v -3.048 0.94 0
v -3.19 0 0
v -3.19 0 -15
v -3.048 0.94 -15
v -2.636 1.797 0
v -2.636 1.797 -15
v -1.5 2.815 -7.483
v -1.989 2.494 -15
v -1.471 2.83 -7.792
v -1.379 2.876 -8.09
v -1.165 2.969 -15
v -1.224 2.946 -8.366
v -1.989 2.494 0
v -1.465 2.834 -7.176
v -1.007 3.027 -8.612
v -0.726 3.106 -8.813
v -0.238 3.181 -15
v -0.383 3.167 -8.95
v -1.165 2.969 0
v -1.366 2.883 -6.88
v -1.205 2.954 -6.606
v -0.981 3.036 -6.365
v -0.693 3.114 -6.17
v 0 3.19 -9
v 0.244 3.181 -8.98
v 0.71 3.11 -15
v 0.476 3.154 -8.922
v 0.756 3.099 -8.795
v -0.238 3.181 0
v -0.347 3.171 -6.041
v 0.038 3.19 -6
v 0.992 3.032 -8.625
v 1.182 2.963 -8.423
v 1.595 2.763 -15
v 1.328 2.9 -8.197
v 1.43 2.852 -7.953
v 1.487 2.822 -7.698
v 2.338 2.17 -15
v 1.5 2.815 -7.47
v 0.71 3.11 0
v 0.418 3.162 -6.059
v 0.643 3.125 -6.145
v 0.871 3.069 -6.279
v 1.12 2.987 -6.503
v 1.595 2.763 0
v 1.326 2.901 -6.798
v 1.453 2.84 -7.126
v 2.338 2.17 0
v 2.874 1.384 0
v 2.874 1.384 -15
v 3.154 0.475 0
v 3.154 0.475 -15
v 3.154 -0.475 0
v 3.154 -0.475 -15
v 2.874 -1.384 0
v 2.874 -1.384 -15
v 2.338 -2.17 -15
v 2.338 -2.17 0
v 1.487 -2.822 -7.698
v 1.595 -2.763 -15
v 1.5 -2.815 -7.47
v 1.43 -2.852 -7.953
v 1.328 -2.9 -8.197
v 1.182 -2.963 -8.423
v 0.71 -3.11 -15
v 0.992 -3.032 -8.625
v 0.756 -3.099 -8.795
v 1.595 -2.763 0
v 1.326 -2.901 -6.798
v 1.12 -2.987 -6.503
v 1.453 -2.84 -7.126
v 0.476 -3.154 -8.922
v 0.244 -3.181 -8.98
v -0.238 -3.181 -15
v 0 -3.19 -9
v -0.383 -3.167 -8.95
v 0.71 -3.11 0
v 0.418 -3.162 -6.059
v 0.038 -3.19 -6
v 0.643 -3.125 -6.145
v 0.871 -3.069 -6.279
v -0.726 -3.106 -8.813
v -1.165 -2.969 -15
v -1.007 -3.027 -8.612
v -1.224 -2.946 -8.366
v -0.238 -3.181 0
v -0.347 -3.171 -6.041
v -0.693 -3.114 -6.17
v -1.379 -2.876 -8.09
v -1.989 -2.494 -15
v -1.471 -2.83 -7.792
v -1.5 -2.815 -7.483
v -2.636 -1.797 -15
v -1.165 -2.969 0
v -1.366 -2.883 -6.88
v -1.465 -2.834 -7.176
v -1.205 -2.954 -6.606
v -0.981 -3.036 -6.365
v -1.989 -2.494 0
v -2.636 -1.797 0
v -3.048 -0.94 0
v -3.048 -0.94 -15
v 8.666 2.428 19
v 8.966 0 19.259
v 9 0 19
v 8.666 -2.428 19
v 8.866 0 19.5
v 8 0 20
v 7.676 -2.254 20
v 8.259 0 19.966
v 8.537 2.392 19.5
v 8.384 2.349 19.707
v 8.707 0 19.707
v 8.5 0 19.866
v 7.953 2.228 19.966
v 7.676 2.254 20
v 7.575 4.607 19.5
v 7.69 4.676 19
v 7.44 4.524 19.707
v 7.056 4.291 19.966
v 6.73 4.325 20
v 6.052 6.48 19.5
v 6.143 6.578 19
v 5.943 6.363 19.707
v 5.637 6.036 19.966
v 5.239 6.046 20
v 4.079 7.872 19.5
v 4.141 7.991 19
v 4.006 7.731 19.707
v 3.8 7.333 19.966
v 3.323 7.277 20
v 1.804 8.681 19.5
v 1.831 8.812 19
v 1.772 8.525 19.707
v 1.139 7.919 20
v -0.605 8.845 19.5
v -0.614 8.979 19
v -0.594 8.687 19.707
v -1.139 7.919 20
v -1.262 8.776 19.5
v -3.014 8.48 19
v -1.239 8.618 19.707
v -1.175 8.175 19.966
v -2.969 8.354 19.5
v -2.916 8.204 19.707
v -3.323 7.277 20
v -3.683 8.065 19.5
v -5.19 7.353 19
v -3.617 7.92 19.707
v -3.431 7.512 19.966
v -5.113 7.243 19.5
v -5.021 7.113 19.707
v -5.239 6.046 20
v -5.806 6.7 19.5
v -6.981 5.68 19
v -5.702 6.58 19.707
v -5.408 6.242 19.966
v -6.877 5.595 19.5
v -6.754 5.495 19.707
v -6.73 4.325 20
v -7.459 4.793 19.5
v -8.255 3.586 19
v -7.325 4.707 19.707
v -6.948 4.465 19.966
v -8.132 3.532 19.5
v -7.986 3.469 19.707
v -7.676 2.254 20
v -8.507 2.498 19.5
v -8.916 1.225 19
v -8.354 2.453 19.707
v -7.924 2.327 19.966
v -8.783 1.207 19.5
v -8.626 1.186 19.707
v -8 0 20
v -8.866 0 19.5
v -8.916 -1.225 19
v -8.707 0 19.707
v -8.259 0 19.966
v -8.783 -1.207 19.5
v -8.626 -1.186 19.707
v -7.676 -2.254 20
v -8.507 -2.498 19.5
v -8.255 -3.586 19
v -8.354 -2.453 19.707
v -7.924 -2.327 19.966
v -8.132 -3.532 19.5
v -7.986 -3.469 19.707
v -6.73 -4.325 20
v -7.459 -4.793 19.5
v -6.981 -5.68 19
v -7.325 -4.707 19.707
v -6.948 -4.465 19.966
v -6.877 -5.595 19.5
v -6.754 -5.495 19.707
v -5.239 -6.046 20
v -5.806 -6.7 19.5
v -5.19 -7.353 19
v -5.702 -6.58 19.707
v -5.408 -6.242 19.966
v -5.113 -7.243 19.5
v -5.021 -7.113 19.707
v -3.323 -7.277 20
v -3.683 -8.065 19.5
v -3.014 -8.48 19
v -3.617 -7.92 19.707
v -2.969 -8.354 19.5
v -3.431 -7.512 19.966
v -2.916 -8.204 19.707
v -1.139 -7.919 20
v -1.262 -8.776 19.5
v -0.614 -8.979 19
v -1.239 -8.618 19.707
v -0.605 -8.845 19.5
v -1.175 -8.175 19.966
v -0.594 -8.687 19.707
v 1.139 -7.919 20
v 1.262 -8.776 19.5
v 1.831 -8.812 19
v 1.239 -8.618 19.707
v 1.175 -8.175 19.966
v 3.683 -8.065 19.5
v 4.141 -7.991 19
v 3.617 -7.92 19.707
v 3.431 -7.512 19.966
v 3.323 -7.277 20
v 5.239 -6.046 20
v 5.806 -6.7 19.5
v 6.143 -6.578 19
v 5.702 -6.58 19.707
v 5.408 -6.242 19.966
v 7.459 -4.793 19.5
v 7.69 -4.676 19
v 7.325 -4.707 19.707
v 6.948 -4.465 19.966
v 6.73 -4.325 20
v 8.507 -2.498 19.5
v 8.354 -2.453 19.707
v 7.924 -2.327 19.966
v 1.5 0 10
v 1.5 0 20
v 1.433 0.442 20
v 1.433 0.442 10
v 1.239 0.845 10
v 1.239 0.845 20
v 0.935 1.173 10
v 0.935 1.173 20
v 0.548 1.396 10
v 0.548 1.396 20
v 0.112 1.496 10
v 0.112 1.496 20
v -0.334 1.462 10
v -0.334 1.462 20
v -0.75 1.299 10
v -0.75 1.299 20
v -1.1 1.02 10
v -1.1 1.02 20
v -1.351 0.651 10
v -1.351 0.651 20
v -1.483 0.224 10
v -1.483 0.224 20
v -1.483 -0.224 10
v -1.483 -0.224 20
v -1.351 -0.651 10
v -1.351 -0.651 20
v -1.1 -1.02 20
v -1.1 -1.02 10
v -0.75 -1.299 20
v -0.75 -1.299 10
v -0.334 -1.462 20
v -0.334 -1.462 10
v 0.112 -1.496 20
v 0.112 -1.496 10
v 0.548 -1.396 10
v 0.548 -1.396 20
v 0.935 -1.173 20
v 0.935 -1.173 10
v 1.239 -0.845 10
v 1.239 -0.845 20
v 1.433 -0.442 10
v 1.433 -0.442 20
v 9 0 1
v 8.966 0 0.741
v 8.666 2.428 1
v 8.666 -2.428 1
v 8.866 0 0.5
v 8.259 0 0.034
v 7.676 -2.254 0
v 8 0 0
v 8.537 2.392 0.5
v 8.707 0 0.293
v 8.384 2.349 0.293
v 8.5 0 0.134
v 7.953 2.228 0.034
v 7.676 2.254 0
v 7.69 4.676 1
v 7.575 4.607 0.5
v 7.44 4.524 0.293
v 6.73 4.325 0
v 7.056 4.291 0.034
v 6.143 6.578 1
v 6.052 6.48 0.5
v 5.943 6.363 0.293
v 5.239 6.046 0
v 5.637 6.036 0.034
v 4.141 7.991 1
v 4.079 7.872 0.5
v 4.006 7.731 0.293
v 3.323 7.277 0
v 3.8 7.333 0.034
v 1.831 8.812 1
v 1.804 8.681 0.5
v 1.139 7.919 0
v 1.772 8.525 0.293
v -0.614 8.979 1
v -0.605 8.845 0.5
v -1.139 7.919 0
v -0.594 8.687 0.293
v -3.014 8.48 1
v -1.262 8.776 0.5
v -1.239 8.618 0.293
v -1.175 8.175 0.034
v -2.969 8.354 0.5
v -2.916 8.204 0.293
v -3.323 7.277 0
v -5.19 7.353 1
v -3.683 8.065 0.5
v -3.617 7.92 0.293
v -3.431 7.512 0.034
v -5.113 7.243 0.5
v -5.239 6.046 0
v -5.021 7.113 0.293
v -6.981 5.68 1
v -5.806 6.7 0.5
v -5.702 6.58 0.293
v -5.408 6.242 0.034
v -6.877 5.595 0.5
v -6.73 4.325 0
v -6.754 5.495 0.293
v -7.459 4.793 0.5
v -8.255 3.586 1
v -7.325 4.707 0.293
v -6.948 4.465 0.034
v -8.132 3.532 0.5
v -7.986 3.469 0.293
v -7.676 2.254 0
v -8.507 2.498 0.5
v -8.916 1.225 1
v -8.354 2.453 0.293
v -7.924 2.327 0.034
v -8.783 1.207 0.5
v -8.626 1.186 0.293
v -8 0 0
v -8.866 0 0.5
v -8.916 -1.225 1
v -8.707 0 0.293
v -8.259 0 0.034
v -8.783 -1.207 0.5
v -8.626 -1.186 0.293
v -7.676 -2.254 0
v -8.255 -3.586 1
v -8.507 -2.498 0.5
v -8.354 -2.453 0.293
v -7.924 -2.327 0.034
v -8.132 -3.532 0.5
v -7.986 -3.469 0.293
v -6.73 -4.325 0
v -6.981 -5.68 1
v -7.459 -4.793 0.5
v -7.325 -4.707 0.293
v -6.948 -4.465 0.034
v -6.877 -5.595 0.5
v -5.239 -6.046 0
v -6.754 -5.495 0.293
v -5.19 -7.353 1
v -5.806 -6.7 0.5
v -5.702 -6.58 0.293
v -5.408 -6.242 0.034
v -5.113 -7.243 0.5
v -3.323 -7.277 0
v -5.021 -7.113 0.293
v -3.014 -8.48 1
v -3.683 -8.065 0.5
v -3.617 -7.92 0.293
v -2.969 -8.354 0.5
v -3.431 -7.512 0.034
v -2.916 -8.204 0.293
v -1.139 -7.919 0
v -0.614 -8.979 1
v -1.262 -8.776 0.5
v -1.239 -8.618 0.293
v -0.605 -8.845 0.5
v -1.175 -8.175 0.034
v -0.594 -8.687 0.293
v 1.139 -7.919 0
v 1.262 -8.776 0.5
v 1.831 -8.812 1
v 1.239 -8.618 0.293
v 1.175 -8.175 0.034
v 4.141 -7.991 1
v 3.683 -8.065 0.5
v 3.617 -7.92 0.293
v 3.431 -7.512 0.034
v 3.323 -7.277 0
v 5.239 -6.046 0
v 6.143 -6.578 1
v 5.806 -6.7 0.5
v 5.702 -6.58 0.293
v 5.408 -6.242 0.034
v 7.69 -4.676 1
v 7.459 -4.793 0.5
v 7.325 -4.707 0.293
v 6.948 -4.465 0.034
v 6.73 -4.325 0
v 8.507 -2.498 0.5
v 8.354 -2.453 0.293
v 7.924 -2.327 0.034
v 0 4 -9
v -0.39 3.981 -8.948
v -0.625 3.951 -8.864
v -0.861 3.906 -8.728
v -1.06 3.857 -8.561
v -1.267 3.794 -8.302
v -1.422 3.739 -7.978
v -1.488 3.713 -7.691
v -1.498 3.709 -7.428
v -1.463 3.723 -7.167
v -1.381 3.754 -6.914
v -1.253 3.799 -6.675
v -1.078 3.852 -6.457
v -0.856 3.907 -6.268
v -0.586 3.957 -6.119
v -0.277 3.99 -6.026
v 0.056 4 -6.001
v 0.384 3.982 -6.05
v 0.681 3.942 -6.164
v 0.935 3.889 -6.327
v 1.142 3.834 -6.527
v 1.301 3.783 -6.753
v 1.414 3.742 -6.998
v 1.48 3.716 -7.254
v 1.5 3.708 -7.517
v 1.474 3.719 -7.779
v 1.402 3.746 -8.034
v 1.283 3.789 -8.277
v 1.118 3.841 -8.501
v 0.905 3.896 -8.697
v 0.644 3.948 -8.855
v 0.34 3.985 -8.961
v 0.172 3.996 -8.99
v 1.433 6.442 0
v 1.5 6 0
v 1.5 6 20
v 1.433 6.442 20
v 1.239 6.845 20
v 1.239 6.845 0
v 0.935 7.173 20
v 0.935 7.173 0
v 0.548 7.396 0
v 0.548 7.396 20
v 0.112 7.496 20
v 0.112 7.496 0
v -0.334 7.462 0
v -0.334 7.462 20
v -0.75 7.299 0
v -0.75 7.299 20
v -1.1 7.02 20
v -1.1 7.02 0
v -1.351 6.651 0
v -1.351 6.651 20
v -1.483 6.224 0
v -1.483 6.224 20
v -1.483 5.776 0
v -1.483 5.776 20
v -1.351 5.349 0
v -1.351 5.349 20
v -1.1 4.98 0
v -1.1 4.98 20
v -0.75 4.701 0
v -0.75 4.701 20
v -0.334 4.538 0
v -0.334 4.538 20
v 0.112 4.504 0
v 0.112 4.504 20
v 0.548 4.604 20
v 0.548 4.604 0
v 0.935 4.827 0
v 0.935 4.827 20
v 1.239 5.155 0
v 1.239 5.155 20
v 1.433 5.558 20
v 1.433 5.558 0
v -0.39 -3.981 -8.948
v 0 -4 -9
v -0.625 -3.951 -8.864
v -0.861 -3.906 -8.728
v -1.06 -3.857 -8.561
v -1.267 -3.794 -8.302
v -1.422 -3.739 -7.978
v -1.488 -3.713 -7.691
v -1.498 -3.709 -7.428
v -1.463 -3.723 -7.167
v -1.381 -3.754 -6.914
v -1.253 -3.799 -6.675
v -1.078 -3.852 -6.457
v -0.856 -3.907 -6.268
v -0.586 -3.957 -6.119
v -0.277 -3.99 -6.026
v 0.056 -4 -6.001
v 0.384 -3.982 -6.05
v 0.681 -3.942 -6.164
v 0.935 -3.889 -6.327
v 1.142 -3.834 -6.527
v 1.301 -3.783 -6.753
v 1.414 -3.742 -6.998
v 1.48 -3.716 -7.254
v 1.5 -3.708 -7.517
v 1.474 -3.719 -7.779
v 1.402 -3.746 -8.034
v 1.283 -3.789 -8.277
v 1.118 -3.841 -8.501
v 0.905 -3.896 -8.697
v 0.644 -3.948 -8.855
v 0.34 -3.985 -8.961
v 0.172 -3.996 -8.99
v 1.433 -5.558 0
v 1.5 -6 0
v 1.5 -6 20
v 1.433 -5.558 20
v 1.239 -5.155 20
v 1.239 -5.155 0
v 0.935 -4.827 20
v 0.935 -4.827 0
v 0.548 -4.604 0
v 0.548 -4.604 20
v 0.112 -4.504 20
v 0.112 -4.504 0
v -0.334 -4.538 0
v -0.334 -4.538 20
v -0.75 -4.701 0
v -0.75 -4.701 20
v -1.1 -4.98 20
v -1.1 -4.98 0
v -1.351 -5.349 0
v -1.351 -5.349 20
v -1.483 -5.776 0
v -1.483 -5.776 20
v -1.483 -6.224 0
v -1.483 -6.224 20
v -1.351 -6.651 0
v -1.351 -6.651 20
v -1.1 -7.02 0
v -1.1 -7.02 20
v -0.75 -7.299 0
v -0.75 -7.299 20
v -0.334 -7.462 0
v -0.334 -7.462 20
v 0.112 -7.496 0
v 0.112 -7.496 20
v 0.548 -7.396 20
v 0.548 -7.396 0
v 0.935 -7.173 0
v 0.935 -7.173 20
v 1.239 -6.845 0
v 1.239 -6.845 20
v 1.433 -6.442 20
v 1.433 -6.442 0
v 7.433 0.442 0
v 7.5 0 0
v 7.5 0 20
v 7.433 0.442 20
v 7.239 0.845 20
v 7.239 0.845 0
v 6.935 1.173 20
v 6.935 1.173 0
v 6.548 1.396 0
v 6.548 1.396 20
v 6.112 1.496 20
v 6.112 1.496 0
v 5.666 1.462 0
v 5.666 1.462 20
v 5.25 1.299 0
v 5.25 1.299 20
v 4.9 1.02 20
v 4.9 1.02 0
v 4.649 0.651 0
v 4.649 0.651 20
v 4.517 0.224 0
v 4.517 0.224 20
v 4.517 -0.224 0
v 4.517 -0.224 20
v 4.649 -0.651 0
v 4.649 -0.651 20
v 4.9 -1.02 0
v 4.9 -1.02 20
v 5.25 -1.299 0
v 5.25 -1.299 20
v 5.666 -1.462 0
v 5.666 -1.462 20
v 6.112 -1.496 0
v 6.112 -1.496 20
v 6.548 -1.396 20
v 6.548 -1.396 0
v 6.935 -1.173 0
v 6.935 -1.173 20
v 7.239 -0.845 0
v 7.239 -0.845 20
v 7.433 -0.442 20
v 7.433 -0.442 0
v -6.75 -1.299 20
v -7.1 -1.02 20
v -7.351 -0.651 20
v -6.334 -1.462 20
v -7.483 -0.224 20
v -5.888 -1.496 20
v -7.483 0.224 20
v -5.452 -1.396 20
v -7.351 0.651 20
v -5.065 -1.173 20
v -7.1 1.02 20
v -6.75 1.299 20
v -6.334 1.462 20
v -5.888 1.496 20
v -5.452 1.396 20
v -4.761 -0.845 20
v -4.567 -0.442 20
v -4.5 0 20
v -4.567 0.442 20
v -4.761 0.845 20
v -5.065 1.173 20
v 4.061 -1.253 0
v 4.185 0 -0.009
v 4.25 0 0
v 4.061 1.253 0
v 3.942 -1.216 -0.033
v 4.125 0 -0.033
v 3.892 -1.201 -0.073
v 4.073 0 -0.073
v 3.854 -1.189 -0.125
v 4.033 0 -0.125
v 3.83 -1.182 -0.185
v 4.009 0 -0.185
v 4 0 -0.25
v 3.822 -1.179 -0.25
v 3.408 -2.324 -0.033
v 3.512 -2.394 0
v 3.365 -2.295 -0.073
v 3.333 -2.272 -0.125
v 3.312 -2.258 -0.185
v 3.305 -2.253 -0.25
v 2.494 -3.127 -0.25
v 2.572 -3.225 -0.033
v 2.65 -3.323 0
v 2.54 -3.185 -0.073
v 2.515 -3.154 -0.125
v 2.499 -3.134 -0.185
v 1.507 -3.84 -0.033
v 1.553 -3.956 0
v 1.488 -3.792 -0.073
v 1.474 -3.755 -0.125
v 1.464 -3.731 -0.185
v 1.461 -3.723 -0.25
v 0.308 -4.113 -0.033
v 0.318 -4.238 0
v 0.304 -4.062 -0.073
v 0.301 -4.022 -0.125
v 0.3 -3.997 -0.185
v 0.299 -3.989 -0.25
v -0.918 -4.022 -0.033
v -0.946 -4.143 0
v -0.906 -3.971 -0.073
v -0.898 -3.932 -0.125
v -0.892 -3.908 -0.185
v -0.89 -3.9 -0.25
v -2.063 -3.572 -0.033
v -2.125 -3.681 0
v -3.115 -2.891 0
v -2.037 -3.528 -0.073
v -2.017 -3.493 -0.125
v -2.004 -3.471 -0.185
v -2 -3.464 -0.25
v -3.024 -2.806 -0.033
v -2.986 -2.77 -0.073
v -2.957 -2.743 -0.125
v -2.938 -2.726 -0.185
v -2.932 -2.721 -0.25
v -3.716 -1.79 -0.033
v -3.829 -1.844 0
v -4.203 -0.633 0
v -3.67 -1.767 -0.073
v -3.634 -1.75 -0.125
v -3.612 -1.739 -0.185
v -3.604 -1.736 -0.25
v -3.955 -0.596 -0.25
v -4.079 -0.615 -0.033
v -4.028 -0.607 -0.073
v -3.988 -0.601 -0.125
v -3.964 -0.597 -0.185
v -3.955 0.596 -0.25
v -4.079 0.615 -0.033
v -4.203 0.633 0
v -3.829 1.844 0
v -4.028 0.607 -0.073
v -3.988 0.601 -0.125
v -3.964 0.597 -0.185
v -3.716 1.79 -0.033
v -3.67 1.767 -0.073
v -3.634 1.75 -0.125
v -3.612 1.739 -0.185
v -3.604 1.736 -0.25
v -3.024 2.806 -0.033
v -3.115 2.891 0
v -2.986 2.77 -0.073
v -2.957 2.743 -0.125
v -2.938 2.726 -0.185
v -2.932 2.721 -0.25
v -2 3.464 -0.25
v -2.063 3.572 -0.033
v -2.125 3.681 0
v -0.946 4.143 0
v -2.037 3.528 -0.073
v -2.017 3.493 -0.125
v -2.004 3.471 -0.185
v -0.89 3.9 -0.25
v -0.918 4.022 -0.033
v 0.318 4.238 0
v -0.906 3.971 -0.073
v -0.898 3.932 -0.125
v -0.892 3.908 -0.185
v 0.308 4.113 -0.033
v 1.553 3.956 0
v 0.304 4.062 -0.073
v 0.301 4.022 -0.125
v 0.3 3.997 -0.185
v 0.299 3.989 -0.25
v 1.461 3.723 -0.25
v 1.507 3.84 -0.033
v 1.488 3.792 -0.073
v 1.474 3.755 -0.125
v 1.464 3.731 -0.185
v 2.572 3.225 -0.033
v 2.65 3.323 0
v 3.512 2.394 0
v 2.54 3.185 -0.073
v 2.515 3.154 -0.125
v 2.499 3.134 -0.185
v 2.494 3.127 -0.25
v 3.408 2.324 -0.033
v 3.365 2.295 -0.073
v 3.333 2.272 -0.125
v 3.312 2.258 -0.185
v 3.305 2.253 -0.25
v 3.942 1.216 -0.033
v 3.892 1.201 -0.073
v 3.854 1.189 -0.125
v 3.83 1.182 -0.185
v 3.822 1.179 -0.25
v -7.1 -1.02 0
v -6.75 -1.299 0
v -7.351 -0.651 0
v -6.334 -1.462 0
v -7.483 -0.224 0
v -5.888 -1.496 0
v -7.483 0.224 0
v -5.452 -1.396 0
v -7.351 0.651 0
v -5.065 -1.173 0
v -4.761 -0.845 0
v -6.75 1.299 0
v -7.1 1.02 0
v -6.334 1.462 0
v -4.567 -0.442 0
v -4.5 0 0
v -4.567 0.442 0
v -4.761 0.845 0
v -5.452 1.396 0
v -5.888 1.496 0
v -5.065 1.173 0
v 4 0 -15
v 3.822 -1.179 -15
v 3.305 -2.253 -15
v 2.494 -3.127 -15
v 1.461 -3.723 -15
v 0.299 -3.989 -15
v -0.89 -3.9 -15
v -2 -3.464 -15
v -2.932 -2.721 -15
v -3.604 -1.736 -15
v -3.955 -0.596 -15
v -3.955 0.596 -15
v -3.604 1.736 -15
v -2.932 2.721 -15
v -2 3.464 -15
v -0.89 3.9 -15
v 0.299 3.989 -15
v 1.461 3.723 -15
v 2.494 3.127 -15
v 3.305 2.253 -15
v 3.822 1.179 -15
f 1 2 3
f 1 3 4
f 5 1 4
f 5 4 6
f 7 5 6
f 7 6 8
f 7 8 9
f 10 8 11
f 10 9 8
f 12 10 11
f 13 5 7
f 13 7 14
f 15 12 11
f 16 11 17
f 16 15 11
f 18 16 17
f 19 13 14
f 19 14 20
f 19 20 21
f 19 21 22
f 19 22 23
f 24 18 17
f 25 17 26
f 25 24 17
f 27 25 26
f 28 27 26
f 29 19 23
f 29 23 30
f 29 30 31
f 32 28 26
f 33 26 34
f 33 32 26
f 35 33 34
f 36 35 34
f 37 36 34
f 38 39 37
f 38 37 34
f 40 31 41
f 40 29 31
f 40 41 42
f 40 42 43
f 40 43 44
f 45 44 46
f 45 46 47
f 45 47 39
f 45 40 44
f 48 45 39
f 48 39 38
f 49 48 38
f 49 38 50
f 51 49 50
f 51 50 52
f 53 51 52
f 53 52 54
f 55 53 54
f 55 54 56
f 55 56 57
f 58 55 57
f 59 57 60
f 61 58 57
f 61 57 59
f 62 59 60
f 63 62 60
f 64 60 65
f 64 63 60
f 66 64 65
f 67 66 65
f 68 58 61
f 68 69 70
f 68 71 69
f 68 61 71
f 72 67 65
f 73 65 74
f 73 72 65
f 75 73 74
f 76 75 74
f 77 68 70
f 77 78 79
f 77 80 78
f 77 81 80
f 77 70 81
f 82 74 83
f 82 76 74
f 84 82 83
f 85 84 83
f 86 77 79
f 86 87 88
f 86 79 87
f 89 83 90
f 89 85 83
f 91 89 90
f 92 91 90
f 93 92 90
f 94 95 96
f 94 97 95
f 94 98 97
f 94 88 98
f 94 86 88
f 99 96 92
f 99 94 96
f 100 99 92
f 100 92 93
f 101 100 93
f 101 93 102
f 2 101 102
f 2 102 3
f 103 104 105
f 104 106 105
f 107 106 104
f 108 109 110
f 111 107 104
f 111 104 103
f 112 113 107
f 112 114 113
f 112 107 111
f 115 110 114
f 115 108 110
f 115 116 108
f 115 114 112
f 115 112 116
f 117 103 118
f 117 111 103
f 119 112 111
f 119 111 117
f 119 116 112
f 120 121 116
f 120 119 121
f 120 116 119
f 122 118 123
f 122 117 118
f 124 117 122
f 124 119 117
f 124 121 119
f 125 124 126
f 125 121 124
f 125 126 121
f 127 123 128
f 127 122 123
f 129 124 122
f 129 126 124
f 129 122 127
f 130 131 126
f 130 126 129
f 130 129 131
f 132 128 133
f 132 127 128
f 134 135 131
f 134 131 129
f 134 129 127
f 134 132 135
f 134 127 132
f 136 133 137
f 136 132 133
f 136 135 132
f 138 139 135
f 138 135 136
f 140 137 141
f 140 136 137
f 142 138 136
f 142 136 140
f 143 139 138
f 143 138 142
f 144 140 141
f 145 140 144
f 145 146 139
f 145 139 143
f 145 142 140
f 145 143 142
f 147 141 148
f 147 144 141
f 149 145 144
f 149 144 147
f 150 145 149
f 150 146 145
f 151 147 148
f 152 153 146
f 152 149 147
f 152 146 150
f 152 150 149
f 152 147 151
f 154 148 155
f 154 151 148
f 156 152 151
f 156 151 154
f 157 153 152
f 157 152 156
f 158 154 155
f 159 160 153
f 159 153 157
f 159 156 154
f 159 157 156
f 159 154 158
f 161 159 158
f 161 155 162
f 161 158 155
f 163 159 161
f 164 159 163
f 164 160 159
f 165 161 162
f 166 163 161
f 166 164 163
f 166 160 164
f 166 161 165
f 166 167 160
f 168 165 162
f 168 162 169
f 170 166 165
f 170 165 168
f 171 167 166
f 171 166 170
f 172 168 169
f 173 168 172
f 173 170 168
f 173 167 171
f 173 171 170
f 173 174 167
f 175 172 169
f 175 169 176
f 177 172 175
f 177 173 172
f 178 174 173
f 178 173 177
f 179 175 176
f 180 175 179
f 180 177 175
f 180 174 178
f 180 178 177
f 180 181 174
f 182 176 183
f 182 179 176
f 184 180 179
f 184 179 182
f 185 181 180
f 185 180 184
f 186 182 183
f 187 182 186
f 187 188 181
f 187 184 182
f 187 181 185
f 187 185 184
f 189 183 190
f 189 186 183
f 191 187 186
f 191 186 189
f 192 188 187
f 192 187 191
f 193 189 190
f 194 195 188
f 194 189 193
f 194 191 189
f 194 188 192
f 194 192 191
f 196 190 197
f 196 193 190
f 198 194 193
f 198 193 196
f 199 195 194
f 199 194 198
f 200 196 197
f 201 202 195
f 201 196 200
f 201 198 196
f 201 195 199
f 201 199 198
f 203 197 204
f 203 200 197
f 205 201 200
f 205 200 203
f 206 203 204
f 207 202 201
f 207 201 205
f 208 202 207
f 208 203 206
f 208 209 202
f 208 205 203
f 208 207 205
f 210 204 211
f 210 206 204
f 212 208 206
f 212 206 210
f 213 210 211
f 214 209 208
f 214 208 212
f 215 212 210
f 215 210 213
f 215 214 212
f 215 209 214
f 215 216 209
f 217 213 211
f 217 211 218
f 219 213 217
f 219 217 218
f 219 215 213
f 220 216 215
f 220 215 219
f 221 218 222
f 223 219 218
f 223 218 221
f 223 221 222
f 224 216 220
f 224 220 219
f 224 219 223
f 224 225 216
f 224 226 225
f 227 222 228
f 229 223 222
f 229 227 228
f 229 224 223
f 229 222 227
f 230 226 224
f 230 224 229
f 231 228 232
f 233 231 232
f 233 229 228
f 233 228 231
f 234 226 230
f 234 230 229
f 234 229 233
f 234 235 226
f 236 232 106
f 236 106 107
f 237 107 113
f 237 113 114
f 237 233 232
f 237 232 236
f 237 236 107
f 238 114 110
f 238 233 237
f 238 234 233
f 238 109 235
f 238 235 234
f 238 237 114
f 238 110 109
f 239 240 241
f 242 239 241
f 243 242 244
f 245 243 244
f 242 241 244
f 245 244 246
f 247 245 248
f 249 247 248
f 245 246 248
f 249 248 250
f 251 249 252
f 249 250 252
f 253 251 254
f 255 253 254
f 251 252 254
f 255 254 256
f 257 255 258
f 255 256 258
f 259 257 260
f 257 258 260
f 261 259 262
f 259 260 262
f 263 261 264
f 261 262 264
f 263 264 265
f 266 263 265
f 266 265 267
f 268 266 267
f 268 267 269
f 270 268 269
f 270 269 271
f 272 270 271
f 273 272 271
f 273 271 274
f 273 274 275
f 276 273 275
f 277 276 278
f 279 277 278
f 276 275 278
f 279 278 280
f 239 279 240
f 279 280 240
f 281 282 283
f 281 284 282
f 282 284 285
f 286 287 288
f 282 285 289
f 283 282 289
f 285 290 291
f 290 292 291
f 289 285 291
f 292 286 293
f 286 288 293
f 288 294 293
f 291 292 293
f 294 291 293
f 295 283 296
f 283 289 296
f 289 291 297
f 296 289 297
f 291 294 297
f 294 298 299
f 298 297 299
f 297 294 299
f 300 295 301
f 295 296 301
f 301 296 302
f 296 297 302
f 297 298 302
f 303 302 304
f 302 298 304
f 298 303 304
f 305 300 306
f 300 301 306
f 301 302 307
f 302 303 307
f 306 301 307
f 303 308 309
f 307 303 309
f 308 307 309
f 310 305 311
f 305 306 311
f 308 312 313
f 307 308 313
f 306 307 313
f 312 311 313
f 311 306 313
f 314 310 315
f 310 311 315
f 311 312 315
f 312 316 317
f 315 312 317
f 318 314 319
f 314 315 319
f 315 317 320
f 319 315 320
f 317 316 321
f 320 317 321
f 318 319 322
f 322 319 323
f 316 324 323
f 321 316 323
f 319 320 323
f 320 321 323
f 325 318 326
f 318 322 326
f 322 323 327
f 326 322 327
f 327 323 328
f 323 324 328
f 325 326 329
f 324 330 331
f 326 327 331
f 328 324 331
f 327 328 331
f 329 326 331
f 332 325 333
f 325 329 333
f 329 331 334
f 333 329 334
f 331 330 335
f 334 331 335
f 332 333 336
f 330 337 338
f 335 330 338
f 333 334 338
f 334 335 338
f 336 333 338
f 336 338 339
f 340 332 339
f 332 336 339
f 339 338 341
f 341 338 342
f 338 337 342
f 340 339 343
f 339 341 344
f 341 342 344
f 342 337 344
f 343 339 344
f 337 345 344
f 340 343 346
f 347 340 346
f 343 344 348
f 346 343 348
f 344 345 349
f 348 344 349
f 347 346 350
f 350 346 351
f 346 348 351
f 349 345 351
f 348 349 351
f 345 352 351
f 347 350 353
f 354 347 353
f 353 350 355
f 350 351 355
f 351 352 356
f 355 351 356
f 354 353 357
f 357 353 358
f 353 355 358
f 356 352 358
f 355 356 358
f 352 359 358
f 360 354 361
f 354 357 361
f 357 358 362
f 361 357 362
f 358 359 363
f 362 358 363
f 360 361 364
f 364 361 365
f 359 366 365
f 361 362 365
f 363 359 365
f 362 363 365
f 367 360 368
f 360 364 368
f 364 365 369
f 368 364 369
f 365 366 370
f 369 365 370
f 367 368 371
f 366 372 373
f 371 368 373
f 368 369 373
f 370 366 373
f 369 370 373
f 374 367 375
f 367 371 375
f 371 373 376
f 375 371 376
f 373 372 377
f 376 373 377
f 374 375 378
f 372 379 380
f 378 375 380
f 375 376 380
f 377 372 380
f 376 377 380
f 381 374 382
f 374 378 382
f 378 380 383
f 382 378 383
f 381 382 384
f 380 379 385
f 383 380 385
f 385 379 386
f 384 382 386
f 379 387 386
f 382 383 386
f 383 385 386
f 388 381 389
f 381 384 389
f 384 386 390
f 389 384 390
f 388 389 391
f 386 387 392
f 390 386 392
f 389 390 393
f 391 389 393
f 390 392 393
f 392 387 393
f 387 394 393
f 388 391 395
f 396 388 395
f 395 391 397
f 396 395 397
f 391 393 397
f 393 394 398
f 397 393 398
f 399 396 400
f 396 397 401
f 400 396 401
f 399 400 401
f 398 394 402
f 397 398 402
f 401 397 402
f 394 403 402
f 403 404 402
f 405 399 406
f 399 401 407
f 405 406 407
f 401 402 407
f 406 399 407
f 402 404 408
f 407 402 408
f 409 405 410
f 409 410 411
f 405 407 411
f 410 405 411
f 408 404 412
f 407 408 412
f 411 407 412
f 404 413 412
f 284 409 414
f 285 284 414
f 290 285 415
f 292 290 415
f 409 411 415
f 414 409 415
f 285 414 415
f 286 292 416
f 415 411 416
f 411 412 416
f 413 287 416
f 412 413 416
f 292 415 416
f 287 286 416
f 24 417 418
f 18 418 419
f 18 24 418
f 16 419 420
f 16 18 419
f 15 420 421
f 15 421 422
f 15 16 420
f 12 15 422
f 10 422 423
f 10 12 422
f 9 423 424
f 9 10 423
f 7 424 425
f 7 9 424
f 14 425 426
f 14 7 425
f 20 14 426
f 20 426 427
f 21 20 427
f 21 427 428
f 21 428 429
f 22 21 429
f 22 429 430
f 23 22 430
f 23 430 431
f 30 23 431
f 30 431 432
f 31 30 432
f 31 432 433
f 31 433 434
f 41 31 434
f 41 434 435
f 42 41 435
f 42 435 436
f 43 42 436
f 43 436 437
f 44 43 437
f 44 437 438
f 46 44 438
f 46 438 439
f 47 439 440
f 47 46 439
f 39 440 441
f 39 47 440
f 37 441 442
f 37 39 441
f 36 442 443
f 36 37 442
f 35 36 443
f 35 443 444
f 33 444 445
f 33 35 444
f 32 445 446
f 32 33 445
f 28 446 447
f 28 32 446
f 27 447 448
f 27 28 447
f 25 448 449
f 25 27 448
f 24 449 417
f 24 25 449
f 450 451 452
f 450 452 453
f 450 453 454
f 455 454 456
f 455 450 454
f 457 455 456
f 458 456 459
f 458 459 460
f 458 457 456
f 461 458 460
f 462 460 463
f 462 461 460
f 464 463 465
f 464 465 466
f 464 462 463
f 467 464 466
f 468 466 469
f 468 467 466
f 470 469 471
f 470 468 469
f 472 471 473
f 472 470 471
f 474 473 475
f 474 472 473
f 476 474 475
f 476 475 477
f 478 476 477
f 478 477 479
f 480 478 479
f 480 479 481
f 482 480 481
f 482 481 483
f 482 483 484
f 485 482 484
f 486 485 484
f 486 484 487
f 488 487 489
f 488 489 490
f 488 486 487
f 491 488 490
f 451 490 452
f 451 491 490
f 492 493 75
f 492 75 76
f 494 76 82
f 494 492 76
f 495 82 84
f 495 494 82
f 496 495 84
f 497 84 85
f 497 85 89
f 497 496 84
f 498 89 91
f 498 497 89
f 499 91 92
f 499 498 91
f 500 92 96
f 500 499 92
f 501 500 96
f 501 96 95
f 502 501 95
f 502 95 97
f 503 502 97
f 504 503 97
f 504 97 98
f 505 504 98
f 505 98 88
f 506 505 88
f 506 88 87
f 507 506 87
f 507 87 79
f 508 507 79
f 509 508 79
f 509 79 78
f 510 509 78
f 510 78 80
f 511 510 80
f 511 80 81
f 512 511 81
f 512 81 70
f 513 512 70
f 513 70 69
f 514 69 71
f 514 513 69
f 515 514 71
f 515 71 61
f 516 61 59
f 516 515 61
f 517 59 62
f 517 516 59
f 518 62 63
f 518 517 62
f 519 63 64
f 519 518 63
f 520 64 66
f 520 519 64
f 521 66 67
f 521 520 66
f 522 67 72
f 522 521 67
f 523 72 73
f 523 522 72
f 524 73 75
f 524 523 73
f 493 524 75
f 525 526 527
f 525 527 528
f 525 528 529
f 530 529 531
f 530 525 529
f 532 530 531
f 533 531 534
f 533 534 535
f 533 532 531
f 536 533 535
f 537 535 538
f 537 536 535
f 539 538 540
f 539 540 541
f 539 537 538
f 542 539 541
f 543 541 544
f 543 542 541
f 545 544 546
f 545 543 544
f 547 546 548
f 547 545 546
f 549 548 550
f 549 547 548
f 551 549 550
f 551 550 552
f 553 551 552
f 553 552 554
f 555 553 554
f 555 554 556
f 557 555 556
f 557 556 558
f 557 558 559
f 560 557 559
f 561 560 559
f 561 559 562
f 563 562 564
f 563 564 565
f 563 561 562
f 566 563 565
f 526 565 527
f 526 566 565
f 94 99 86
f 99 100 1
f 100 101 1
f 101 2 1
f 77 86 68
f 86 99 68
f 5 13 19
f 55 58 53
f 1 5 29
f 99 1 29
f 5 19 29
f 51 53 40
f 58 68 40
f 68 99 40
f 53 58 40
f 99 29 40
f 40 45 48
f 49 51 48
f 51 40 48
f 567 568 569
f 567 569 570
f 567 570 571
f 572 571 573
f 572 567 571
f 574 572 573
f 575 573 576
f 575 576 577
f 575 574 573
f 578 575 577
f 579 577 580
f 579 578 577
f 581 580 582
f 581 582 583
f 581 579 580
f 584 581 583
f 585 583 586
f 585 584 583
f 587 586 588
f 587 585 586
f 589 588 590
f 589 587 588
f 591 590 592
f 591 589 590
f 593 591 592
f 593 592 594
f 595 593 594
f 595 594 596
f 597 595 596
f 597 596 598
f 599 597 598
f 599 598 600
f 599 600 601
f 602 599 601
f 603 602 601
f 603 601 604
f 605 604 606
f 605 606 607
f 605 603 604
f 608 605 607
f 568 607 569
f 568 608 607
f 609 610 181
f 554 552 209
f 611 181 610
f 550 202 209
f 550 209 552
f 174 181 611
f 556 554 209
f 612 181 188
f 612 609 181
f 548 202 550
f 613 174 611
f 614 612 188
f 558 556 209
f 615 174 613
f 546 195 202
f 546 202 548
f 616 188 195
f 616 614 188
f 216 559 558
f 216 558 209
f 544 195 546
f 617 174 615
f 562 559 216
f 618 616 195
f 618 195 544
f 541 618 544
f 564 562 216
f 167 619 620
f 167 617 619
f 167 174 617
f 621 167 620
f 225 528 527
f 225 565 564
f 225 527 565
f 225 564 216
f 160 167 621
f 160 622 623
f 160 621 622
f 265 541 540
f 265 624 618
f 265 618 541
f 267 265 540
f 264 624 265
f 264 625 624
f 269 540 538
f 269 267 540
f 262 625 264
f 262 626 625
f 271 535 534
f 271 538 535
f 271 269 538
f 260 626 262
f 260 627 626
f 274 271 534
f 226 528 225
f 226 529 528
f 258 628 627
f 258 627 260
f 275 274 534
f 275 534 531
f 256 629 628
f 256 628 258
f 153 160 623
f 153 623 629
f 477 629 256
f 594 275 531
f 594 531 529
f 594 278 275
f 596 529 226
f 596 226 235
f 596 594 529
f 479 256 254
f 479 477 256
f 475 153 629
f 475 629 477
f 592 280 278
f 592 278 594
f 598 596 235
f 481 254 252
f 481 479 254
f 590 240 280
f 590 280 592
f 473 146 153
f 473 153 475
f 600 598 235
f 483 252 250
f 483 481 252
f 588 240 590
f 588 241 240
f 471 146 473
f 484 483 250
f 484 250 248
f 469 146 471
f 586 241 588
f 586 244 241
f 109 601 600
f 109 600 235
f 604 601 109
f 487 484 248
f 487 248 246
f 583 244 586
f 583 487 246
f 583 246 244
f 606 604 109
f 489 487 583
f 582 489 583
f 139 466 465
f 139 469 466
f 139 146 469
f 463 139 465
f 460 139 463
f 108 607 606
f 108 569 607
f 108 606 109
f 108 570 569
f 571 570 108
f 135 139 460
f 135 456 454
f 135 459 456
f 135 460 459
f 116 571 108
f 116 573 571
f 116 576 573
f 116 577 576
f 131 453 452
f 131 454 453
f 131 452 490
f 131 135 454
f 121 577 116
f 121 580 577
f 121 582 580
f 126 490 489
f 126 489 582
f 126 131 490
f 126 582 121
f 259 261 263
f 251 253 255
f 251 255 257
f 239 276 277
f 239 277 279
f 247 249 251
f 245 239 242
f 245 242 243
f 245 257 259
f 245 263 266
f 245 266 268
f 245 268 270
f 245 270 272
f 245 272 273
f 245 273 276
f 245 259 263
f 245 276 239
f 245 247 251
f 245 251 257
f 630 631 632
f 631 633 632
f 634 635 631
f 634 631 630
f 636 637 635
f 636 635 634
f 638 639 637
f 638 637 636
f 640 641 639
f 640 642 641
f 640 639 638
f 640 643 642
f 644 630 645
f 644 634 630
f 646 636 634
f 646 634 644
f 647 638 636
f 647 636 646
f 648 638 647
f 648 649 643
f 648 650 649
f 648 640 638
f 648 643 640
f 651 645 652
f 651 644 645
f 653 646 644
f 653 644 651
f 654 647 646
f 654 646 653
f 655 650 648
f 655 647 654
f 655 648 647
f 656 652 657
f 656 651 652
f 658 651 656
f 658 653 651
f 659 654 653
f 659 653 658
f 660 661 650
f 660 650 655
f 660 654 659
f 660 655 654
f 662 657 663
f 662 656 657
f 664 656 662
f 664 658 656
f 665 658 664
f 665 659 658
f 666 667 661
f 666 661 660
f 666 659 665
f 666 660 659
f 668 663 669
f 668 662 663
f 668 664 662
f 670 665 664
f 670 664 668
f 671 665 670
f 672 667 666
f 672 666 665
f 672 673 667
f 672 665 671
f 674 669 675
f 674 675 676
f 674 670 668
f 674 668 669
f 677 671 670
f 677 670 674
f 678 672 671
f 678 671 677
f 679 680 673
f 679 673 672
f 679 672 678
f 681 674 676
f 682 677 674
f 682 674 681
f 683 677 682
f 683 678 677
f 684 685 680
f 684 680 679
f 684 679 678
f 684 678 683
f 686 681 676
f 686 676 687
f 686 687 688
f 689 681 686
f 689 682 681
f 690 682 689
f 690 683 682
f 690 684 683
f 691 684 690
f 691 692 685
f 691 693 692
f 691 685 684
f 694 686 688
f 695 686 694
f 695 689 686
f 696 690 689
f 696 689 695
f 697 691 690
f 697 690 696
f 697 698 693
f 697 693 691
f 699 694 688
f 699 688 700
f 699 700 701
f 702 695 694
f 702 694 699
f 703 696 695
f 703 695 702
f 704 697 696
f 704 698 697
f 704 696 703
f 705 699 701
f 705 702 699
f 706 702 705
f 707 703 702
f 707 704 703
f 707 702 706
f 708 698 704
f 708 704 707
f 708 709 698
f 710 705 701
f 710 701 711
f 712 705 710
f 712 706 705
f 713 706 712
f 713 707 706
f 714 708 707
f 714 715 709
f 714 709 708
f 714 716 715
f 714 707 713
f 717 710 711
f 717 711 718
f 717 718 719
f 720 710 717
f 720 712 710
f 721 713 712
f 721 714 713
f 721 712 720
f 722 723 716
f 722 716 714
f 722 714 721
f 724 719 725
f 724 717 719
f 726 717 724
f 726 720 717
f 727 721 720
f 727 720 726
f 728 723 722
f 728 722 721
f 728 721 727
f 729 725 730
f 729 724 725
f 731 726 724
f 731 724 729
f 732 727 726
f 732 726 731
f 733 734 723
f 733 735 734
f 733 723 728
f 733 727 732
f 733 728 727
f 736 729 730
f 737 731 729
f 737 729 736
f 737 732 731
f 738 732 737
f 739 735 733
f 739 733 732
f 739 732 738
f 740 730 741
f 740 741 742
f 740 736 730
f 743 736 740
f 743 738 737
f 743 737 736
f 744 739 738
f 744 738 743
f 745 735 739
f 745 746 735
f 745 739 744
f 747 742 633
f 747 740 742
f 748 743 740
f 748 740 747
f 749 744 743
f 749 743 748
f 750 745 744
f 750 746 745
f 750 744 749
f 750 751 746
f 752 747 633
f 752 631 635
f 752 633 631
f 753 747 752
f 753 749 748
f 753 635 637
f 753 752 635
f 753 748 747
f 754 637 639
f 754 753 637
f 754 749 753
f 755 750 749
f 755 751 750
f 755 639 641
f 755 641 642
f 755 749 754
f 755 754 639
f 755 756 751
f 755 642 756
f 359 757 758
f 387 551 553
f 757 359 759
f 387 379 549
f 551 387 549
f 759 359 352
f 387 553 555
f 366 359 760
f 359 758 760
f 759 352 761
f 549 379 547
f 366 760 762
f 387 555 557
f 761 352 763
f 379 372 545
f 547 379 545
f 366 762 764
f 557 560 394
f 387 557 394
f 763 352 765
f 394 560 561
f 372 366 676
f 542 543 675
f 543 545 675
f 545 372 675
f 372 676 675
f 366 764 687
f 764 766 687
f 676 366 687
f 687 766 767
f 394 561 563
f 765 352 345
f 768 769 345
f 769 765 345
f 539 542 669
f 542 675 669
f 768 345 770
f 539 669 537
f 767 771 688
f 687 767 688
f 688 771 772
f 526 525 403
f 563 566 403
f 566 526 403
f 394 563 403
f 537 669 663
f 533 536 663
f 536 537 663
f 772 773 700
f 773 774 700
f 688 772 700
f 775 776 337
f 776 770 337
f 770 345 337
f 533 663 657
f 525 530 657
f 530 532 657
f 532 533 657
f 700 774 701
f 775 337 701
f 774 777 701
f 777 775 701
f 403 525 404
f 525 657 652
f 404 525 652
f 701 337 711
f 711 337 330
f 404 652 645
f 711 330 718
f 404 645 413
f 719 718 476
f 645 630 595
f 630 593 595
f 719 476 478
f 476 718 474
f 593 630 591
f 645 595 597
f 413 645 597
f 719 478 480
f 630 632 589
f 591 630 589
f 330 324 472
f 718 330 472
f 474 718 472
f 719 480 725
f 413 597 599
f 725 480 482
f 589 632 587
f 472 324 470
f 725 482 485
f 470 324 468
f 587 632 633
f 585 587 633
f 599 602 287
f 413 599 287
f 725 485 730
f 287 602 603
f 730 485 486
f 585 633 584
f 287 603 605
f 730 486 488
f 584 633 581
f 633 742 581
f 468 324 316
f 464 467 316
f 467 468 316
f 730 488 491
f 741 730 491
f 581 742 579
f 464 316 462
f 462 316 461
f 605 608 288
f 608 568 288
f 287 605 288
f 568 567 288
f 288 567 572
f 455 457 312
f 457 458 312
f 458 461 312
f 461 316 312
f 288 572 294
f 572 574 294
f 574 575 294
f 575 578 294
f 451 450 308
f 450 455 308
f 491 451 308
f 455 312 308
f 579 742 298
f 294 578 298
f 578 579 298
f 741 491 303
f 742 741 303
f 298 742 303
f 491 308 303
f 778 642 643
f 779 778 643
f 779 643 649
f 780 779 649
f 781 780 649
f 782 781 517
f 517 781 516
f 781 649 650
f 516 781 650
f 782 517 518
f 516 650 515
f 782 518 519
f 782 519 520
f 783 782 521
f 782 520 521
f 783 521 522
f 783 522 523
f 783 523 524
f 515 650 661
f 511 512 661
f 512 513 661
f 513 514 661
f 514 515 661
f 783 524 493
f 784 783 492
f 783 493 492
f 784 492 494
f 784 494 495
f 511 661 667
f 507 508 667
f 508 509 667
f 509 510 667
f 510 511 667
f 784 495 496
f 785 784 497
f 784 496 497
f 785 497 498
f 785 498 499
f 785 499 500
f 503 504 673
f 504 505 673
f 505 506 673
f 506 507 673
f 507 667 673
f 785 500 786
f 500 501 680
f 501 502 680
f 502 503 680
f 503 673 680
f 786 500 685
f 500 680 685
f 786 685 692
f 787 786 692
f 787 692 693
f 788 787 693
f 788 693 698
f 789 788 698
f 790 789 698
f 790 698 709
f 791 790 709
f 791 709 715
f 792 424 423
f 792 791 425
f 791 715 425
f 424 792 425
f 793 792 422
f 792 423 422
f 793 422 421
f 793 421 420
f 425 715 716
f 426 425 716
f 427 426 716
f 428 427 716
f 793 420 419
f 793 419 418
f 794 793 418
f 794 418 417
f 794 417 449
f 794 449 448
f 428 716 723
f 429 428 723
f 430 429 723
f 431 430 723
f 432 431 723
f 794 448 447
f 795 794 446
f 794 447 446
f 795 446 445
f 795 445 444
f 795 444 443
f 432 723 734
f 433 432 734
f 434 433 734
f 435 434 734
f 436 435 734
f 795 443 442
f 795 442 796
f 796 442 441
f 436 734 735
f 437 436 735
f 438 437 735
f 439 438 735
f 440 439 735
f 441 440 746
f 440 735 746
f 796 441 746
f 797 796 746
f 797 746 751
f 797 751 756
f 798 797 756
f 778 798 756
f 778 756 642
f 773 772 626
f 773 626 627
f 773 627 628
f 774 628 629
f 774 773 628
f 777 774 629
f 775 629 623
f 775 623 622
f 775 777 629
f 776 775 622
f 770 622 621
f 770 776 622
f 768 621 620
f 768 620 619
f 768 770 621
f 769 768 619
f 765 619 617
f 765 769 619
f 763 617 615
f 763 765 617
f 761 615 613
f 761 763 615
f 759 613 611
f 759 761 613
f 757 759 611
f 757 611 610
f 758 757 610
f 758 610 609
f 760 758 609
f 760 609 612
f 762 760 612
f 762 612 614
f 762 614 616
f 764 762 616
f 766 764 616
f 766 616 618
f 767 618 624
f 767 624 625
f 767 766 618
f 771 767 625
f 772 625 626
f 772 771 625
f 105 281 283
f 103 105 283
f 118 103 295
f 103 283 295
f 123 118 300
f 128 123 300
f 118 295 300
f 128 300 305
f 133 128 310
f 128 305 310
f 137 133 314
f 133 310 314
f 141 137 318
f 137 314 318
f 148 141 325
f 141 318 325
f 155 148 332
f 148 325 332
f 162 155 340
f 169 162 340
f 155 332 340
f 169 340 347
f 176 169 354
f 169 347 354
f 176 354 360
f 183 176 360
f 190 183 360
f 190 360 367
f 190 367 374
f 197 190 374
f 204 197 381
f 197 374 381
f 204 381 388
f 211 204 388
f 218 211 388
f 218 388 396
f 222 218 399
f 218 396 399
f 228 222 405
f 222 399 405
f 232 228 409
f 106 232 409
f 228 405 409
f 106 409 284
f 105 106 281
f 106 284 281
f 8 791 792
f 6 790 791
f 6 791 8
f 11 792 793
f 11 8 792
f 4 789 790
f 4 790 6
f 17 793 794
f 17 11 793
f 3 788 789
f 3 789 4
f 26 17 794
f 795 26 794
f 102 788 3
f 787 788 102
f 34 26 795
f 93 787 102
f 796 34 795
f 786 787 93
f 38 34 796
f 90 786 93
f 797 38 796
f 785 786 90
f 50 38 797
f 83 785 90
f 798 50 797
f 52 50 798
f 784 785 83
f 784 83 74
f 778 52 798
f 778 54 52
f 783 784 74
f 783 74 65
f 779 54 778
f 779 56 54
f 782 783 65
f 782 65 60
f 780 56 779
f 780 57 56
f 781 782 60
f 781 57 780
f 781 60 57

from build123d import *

# Parameters (mm, degrees)
ESQUISSE1_R                  = 9
ESQUISSE1_R_2                = 1.5
BOSS_EXTRU_1_DEPTH           = 20
ESQUISSE2_R                  = 4
ESQUISSE2_R_2                = 3.19
BOSS_EXTRU_2_DEPTH           = 15
CONG_1_R                     = 0.25
CONG_2_R                     = 1
CONG_3_R                     = 1
ENL_V_MAT_EXTRU_1_DEPTH      = 10
ENL_V_MAT_EXTRU_1_DEPTH_BACK = 10
ESQUISSE3_R                  = 1.5
ESQUISSE4_R                  = 1.5
ENL_V_MAT_EXTRU_2_DEPTH      = 10


with BuildPart() as part:
    # Esquisse1 → Boss.-Extru.1 (new body)
    with BuildSketch(Plane.XY):
        Circle(ESQUISSE1_R)
        with Locations((0, 6)):
            Circle(ESQUISSE1_R_2, mode=Mode.SUBTRACT)
        with Locations((6, 0)):
            Circle(ESQUISSE1_R_2, mode=Mode.SUBTRACT)
        with Locations((0, -6)):
            Circle(ESQUISSE1_R_2, mode=Mode.SUBTRACT)
        with Locations((-6, 0)):
            Circle(ESQUISSE1_R_2, mode=Mode.SUBTRACT)
    extrude(amount=BOSS_EXTRU_1_DEPTH)

    # Esquisse2 → Boss.-Extru.2 (add)
    with BuildSketch(Plane(origin=(0, 0, 0), x_dir=(-1, 0, 0), z_dir=(0, 0, -1))):
        Circle(ESQUISSE2_R)
        Circle(ESQUISSE2_R_2, mode=Mode.SUBTRACT)
    extrude(amount=BOSS_EXTRU_2_DEPTH)

    # Congé1
    cong_1_edges = [part.edges().sort_by_distance(p)[0] for p in [
        (4, 0, 0),
    ]]
    fillet(cong_1_edges, radius=CONG_1_R)

    # Congé2
    cong_2_edges = [part.edges().sort_by_distance(p)[0] for p in [
        (-9, 0, 20),
    ]]
    fillet(cong_2_edges, radius=CONG_2_R)

    # Congé3
    cong_3_edges = [part.edges().sort_by_distance(p)[0] for p in [
        (-9, 0, 0),
    ]]
    fillet(cong_3_edges, radius=CONG_3_R)

    # Esquisse3 → Enlèv. mat.-Extru.1 (cut, two sides: drawn at the far end of the back side and taken through both)
    with BuildSketch(Plane(origin=(0, 0, 0), x_dir=(1, 0, 0), z_dir=(0, 1, 0)).offset(-ENL_V_MAT_EXTRU_1_DEPTH_BACK)):
        with Locations((0, 7.5)):
            Circle(ESQUISSE3_R)
    extrude(amount=ENL_V_MAT_EXTRU_1_DEPTH + ENL_V_MAT_EXTRU_1_DEPTH_BACK, mode=Mode.SUBTRACT)

    # Esquisse4 → Enlèv. mat.-Extru.2 (cut)
    with BuildSketch(Plane.XY.offset(20)):
        Circle(ESQUISSE4_R)
    extrude(amount=-ENL_V_MAT_EXTRU_2_DEPTH, mode=Mode.SUBTRACT)


solid = part.part
